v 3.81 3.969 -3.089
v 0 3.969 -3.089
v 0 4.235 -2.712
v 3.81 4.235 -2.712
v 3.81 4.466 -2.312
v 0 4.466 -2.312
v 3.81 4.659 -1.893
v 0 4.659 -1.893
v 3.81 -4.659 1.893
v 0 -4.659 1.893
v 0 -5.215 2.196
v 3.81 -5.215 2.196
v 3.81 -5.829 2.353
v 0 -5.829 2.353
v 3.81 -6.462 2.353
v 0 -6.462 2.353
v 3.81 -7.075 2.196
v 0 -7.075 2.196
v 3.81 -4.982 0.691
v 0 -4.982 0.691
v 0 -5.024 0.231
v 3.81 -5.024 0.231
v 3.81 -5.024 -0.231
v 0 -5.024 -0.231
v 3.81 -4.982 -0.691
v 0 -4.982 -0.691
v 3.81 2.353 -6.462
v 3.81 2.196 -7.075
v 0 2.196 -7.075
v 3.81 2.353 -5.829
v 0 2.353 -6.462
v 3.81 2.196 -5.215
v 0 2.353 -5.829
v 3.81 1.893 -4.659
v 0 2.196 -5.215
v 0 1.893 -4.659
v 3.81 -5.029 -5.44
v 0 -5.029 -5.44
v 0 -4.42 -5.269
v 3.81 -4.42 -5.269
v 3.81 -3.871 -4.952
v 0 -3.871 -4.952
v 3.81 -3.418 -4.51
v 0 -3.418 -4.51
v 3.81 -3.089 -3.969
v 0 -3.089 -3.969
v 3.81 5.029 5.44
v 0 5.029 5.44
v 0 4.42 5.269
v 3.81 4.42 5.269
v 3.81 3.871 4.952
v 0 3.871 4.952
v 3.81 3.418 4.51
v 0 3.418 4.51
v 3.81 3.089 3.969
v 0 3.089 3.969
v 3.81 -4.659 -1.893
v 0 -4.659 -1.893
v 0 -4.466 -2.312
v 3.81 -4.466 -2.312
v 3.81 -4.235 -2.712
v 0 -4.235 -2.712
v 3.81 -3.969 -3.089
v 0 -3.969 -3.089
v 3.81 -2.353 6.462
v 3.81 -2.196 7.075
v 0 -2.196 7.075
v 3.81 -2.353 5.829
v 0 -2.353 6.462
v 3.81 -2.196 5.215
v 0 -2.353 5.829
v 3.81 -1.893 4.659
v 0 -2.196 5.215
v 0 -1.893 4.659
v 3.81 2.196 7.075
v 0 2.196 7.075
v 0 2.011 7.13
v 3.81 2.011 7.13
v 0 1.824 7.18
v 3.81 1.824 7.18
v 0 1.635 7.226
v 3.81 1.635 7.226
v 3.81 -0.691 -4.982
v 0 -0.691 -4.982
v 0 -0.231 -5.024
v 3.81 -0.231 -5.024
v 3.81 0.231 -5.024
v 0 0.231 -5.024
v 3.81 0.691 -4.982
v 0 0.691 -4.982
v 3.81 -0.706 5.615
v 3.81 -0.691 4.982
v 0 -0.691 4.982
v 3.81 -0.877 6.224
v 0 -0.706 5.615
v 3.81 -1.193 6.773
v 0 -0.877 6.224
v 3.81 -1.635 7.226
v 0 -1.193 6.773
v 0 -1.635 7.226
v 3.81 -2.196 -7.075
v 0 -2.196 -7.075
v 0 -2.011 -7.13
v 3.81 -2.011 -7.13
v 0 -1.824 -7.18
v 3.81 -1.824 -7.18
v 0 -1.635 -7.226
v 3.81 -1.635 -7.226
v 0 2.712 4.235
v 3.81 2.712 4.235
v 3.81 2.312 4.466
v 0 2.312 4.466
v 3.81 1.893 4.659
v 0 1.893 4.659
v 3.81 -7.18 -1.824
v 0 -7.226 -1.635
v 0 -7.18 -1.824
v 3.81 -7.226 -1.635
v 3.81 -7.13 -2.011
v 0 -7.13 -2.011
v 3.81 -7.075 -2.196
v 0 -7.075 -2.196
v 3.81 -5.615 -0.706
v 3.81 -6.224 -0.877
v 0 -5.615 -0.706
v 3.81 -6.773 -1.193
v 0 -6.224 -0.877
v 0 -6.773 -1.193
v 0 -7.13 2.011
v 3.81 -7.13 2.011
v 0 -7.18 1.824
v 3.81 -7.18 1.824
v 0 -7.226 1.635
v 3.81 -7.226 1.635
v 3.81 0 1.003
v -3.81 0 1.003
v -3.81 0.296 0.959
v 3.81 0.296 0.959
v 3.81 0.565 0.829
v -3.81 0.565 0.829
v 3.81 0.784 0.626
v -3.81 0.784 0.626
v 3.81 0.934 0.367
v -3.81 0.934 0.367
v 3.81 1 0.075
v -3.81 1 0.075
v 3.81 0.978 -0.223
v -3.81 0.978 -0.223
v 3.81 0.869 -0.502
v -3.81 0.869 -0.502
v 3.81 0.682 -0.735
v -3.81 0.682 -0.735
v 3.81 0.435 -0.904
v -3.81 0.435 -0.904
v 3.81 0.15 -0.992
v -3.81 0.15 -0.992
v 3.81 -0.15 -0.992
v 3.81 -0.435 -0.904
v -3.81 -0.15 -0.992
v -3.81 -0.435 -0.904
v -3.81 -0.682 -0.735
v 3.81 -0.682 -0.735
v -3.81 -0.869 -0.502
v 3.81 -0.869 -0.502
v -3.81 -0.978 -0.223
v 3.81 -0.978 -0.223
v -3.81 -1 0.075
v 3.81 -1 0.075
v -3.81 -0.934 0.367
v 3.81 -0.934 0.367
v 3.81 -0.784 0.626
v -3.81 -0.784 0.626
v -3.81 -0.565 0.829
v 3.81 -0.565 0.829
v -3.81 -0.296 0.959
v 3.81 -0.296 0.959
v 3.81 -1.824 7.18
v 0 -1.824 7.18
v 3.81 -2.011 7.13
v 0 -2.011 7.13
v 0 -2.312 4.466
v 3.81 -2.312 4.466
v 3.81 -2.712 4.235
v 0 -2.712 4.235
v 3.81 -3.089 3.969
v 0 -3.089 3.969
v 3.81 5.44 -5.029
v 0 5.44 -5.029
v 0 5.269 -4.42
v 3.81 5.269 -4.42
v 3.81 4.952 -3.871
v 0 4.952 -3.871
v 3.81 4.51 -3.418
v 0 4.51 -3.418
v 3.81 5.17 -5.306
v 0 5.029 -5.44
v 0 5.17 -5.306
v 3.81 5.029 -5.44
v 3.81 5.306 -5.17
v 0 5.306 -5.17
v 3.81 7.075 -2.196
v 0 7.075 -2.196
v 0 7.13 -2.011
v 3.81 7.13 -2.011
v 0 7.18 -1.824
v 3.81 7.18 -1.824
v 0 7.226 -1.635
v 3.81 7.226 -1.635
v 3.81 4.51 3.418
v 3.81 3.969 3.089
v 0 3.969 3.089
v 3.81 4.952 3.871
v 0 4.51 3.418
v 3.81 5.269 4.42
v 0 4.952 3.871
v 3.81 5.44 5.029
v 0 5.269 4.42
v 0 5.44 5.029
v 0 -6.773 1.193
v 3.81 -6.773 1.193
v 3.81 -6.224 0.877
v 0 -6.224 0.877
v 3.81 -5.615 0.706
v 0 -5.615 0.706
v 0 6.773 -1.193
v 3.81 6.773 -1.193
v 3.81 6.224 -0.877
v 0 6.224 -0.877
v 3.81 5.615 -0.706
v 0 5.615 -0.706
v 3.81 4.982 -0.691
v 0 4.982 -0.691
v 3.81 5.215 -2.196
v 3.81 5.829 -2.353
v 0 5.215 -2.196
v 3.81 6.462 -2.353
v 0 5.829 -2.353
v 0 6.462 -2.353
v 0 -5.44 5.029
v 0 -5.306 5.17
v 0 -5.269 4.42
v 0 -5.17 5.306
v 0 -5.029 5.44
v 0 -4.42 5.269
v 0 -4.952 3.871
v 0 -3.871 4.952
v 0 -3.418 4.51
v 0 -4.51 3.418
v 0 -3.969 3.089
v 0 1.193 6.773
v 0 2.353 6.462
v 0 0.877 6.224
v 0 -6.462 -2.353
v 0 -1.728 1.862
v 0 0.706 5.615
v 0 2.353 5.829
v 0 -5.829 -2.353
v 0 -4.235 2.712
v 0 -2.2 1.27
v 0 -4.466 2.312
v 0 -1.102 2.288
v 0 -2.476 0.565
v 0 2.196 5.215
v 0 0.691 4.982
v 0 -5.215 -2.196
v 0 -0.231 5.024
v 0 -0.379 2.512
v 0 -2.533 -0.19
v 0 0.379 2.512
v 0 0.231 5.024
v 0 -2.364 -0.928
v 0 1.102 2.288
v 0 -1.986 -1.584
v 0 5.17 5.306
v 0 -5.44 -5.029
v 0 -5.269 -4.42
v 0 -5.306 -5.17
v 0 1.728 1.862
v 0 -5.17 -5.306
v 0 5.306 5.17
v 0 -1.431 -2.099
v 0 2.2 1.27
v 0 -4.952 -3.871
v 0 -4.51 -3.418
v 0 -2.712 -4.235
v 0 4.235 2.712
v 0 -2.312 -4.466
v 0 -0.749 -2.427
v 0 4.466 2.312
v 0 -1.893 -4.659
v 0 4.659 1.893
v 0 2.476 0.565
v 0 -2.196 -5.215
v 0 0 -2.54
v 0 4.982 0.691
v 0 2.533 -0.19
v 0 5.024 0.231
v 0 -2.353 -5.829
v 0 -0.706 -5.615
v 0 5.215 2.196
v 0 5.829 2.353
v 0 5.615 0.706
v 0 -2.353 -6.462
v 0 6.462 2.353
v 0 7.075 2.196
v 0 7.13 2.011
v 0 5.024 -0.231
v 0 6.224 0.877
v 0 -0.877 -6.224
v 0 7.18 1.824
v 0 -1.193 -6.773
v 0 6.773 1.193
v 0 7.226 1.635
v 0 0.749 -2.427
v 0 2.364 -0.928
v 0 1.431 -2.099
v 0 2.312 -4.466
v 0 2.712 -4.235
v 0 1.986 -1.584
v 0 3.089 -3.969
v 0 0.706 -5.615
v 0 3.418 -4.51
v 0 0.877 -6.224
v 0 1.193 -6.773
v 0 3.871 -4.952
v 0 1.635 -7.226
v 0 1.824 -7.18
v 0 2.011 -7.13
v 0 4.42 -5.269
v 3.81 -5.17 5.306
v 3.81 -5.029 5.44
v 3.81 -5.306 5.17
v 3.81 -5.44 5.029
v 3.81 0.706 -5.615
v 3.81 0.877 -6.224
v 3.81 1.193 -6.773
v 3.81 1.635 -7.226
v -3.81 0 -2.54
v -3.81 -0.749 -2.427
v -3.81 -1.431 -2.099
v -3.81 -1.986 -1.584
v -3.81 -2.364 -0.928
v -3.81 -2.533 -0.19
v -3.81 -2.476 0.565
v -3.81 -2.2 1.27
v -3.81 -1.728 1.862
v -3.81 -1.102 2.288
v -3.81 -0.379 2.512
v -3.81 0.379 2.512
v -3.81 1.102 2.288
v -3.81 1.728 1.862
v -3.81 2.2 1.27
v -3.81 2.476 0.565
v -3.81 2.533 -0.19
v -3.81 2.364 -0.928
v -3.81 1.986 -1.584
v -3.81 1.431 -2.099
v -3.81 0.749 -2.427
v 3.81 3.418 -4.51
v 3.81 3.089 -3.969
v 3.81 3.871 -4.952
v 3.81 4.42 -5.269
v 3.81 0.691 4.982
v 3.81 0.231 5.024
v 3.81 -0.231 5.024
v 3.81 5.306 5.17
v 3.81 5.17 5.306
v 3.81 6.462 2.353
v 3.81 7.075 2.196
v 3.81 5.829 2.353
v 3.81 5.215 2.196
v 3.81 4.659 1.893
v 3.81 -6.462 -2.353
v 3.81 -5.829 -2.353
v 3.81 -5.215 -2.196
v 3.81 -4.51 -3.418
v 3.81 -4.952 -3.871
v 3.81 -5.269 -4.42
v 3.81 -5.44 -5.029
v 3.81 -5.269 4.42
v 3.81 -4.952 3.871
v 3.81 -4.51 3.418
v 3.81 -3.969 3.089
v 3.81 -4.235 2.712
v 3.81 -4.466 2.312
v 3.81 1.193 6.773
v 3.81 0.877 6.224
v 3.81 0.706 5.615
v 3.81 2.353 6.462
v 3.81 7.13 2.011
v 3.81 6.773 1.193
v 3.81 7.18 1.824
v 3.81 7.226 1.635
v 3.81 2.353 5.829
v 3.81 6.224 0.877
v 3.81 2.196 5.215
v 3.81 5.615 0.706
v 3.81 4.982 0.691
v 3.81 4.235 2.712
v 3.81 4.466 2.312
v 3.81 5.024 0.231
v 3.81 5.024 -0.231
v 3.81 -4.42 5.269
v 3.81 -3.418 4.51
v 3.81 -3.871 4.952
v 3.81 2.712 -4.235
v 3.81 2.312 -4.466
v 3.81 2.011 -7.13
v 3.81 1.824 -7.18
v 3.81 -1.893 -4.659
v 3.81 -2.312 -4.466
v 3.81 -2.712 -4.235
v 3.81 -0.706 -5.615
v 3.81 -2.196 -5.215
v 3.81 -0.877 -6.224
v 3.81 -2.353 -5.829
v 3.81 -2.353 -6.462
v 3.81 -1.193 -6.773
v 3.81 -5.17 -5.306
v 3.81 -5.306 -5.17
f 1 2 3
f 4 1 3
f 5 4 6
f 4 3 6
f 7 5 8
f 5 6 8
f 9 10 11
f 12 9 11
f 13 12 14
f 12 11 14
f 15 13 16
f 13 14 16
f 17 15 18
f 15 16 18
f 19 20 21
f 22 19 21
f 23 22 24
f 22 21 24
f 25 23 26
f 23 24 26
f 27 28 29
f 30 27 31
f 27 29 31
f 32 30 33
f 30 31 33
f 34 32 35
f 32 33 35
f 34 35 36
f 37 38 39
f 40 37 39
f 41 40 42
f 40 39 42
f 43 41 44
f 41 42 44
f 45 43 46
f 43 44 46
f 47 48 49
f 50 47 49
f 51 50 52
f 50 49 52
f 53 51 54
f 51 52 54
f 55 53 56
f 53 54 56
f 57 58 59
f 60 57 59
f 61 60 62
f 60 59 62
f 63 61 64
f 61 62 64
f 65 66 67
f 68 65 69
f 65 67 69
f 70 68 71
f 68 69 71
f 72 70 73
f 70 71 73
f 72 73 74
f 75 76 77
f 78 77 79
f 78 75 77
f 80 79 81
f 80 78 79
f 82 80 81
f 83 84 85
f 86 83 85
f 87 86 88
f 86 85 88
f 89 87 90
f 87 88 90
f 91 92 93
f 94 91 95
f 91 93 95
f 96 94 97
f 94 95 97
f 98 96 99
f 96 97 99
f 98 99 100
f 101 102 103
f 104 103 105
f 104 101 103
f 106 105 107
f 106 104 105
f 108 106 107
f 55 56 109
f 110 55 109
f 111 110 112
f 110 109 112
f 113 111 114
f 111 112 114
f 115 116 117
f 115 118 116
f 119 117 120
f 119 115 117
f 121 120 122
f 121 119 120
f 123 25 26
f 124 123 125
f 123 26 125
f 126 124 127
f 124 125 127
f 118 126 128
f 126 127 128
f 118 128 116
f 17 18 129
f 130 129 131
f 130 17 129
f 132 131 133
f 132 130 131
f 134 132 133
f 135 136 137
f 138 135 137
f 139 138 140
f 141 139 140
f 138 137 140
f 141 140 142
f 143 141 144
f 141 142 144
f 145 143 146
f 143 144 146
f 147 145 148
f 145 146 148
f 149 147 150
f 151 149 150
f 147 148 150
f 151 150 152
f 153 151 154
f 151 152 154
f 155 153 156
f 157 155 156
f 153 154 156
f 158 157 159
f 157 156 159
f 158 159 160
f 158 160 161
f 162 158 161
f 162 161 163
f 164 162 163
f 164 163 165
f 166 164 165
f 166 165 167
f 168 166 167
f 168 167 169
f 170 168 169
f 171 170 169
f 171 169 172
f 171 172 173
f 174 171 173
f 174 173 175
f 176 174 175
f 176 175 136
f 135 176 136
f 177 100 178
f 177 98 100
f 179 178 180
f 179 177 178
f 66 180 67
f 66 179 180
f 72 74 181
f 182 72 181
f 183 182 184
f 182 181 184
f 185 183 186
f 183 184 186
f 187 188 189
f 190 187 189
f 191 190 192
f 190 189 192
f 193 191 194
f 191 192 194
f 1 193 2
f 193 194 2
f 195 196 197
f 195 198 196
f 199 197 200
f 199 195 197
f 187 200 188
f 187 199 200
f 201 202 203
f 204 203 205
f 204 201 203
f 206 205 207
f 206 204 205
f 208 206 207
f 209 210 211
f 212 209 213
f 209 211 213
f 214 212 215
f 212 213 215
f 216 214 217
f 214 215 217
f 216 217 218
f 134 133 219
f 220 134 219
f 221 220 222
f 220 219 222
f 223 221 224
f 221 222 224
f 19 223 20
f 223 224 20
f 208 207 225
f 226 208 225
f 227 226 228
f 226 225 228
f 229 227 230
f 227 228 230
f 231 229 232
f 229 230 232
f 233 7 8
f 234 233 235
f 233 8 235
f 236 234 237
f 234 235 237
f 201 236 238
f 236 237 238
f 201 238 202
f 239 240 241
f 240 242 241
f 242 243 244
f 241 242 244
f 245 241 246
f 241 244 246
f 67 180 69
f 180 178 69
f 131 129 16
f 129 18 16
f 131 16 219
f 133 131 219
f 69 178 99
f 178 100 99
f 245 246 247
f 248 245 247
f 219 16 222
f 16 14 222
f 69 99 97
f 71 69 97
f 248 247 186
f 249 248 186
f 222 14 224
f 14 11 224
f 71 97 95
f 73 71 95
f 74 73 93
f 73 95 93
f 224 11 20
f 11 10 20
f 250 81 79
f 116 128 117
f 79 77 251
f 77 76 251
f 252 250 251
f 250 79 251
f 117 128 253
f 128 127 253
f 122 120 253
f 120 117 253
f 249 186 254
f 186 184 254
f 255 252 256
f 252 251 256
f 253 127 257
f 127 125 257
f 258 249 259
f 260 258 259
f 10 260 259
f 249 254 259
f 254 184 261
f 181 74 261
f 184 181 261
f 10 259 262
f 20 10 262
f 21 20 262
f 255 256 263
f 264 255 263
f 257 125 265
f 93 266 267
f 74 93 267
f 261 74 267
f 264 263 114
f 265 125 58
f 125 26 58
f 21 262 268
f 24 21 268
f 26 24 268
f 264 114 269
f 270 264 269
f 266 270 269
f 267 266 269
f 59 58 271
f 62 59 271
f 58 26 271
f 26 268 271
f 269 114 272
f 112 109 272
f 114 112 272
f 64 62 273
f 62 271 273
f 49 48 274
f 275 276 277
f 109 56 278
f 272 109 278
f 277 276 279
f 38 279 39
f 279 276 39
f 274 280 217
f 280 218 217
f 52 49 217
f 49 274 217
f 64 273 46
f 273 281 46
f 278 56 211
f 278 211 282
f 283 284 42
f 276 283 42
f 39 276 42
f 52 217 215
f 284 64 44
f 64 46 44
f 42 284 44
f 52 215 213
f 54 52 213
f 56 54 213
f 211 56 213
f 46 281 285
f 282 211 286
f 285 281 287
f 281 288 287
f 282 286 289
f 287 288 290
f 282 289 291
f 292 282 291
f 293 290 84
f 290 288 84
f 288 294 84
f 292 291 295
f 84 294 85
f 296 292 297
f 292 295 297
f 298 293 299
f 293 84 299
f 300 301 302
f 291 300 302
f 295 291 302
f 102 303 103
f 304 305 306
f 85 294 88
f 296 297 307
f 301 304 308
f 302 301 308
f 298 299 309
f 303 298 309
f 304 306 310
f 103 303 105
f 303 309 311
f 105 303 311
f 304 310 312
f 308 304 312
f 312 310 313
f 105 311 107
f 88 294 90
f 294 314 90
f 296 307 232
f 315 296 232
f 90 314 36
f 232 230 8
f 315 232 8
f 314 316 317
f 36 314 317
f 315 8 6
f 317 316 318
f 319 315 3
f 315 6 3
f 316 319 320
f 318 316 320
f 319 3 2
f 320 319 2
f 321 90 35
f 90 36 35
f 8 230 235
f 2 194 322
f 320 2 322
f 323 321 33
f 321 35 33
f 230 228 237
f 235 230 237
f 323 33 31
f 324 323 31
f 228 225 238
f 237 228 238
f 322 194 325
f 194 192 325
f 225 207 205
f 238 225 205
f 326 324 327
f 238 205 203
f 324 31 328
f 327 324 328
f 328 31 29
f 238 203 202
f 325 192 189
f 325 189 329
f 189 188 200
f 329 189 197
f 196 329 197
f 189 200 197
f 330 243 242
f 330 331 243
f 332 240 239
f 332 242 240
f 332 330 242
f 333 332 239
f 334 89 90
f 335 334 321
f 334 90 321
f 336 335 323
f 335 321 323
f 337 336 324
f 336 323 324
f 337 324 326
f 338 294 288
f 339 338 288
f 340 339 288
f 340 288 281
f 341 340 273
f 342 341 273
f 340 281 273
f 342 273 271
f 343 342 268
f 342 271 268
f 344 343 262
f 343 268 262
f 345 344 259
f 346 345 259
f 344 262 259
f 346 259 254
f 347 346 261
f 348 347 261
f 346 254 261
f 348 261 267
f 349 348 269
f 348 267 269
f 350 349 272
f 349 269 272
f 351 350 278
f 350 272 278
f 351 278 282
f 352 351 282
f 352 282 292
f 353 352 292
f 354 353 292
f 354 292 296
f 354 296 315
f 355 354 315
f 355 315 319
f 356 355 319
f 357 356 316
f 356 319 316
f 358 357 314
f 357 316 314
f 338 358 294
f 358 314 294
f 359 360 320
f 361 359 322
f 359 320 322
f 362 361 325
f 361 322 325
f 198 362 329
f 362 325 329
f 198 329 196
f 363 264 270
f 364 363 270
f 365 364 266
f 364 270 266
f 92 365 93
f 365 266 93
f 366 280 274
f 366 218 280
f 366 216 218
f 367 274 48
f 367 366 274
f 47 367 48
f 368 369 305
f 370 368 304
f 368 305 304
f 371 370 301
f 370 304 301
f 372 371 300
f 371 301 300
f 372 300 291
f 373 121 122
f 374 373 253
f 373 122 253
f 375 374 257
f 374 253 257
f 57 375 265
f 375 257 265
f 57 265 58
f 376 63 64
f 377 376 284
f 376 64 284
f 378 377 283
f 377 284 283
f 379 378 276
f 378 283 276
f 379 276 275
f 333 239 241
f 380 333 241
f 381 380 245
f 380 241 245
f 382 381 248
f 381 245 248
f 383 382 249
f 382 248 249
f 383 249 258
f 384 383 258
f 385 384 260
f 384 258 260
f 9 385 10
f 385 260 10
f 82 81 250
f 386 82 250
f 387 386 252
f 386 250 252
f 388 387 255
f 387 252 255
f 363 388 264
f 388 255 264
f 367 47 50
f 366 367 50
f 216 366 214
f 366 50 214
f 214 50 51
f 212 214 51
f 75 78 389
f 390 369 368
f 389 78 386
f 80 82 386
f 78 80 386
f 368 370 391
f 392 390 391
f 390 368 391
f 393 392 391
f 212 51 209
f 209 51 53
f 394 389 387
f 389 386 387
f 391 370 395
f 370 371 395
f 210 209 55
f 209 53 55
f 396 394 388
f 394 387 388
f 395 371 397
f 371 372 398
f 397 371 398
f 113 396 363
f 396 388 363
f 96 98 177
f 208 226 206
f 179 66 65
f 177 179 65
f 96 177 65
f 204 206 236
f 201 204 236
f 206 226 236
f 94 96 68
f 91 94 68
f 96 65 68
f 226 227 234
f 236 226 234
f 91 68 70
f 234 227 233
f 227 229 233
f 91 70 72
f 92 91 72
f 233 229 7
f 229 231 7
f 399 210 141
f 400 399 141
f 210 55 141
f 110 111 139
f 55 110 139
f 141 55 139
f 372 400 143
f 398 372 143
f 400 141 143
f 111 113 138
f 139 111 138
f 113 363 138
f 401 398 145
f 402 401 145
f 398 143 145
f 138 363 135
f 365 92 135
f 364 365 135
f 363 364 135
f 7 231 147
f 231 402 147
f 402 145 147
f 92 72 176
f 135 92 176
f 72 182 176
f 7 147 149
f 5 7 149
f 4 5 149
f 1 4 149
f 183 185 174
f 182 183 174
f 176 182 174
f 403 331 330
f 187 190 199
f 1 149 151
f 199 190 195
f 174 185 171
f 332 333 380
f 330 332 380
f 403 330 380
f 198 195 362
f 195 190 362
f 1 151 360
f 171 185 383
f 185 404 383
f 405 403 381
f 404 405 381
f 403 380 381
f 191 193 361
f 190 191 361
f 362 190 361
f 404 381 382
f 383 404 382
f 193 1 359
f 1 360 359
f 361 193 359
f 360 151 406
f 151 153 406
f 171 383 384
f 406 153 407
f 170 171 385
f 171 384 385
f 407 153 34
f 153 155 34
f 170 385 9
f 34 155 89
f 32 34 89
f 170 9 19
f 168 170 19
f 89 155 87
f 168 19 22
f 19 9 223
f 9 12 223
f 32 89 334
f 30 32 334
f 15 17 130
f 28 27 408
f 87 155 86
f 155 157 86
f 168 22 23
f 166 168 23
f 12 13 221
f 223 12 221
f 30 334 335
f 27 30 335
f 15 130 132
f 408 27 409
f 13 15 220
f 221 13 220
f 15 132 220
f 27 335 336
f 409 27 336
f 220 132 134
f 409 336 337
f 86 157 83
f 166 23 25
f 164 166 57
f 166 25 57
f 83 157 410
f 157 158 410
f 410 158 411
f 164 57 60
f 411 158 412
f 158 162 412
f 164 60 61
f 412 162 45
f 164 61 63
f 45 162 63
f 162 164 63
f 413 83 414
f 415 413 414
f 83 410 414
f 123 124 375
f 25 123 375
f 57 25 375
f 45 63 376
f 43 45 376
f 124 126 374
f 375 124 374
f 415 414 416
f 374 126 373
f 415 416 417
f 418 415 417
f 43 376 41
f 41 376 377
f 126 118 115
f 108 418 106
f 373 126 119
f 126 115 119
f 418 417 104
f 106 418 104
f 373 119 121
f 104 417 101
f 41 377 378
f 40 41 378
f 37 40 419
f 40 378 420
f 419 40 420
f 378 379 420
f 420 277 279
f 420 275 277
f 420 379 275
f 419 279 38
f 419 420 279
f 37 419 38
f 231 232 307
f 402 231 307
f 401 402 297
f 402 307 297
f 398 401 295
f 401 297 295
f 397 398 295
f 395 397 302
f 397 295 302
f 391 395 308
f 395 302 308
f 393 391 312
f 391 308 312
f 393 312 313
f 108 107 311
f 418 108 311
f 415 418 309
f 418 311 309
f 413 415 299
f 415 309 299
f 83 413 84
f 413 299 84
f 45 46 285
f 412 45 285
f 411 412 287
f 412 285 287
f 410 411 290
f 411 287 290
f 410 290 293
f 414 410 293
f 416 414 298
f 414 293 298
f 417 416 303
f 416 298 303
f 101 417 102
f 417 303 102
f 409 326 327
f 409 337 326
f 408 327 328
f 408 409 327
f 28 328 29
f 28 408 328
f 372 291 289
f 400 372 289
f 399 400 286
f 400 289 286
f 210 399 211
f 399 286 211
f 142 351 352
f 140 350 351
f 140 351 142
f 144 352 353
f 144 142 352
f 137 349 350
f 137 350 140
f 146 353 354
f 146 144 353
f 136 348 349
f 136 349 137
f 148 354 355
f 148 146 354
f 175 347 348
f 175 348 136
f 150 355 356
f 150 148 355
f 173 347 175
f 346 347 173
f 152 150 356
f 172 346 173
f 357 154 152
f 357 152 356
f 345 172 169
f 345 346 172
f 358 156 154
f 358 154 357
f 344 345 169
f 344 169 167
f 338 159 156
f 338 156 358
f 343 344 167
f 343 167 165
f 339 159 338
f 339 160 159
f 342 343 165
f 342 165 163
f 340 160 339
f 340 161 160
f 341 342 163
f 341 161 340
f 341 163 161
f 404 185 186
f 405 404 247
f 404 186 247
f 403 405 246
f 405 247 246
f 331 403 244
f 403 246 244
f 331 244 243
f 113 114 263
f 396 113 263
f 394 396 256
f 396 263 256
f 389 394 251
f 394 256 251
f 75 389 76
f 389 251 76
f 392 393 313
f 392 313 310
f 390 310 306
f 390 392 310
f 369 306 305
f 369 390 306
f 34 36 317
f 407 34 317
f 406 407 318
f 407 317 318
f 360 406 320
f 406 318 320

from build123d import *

# Parameters (mm, degrees)
BASPROSKE_W         = 3.81
BASPROSKE_H         = 7.408333333
TOOTHCUT_DEPTH      = 12.148224323
TEETHCUTS_COUNT     = 12
TEETHCUTS_ANGLE     = 330
BORSKE_R            = 5.0038
BORE_DEPTH          = 50.8000508
SKETCH1_R           = 5.0038
BOSS_EXTRUDE1_DEPTH = 3.81
SKETCH2_R           = 2.54
BOSS_EXTRUDE2_DEPTH = 3.81
SKETCH3_R           = 1.0033
CUT_EXTRUDE1_DEPTH  = 13.746829501


with BuildPart() as part:
    # BasProSke → Base-Revolve (revolve)
    with BuildSketch(Plane(origin=(0, 0, 0), x_dir=(1, 0, 0), z_dir=(0, 1, 0)), mode=Mode.PRIVATE) as base_revolve_sk:
        with Locations((1.905, 3.704166667)):
            Rectangle(BASPROSKE_W, BASPROSKE_H)
    revolve(base_revolve_sk.sketch.rotate(Axis((-10, 0, 0), (1, 0, 0)), 180), axis=Axis((-10, 0, 0), (1, 0, 0)))

    # TooCutSke → ToothCut (cut, through all)
    with BuildSketch(Plane(origin=(0, 0, 0), x_dir=(0, 0, -1), z_dir=(1, 0, 0))):
        with BuildLine():
            ThreePointArc((0.69063345, 4.981553782), (0, 5.0292), (-0.69063345, 4.981553782))
            ThreePointArc((-0.69063345, 4.981553782), (-0.883041418, 6.239186652), (-1.661175181, 7.245749671))
            ThreePointArc((-1.661175181, 7.245749671), (0, 7.433733333), (1.661175181, 7.245749671))
            ThreePointArc((1.661175181, 7.245749671), (0.883041418, 6.239186652), (0.69063345, 4.981553782))
        make_face()
    toothcut = extrude(amount=TOOTHCUT_DEPTH, mode=Mode.SUBTRACT)

    # TeethCuts: ToothCut ×12 about axis
    teethcuts_axis = Axis((-10, 0, 0), (1, 0, 0))
    for i in range(1, TEETHCUTS_COUNT):
        add(toothcut.rotate(teethcuts_axis, i * TEETHCUTS_ANGLE / (TEETHCUTS_COUNT - 1)), mode=Mode.SUBTRACT)

    # BorSke → Bore (cut, symmetric)
    with BuildSketch(Plane(origin=(0, 0, 0), x_dir=(0, 0, -1), z_dir=(1, 0, 0))):
        with Locations(Location((0, 0, 0), (0, 0, 180))):
            Circle(BORSKE_R)
    extrude(amount=BORE_DEPTH, both=True, mode=Mode.SUBTRACT)

    # Sketch1 → Boss-Extrude1 (add)
    with BuildSketch(Plane(origin=(0, 0, 0), x_dir=(0, 0, -1), z_dir=(1, 0, 0))):
        Circle(SKETCH1_R)
    extrude(amount=BOSS_EXTRUDE1_DEPTH)

    # Sketch2 → Boss-Extrude2 (add)
    with BuildSketch(Plane.ZY):
        with Locations(Location((0, 0, 0), (0, 0, 180))):
            Circle(SKETCH2_R)
    extrude(amount=BOSS_EXTRUDE2_DEPTH)

    # Sketch3 → Cut-Extrude1 (cut, through all)
    with BuildSketch(Plane.ZY.offset(3.81)):
        Circle(SKETCH3_R)
    extrude(amount=-CUT_EXTRUDE1_DEPTH, mode=Mode.SUBTRACT)


solid = part.part
